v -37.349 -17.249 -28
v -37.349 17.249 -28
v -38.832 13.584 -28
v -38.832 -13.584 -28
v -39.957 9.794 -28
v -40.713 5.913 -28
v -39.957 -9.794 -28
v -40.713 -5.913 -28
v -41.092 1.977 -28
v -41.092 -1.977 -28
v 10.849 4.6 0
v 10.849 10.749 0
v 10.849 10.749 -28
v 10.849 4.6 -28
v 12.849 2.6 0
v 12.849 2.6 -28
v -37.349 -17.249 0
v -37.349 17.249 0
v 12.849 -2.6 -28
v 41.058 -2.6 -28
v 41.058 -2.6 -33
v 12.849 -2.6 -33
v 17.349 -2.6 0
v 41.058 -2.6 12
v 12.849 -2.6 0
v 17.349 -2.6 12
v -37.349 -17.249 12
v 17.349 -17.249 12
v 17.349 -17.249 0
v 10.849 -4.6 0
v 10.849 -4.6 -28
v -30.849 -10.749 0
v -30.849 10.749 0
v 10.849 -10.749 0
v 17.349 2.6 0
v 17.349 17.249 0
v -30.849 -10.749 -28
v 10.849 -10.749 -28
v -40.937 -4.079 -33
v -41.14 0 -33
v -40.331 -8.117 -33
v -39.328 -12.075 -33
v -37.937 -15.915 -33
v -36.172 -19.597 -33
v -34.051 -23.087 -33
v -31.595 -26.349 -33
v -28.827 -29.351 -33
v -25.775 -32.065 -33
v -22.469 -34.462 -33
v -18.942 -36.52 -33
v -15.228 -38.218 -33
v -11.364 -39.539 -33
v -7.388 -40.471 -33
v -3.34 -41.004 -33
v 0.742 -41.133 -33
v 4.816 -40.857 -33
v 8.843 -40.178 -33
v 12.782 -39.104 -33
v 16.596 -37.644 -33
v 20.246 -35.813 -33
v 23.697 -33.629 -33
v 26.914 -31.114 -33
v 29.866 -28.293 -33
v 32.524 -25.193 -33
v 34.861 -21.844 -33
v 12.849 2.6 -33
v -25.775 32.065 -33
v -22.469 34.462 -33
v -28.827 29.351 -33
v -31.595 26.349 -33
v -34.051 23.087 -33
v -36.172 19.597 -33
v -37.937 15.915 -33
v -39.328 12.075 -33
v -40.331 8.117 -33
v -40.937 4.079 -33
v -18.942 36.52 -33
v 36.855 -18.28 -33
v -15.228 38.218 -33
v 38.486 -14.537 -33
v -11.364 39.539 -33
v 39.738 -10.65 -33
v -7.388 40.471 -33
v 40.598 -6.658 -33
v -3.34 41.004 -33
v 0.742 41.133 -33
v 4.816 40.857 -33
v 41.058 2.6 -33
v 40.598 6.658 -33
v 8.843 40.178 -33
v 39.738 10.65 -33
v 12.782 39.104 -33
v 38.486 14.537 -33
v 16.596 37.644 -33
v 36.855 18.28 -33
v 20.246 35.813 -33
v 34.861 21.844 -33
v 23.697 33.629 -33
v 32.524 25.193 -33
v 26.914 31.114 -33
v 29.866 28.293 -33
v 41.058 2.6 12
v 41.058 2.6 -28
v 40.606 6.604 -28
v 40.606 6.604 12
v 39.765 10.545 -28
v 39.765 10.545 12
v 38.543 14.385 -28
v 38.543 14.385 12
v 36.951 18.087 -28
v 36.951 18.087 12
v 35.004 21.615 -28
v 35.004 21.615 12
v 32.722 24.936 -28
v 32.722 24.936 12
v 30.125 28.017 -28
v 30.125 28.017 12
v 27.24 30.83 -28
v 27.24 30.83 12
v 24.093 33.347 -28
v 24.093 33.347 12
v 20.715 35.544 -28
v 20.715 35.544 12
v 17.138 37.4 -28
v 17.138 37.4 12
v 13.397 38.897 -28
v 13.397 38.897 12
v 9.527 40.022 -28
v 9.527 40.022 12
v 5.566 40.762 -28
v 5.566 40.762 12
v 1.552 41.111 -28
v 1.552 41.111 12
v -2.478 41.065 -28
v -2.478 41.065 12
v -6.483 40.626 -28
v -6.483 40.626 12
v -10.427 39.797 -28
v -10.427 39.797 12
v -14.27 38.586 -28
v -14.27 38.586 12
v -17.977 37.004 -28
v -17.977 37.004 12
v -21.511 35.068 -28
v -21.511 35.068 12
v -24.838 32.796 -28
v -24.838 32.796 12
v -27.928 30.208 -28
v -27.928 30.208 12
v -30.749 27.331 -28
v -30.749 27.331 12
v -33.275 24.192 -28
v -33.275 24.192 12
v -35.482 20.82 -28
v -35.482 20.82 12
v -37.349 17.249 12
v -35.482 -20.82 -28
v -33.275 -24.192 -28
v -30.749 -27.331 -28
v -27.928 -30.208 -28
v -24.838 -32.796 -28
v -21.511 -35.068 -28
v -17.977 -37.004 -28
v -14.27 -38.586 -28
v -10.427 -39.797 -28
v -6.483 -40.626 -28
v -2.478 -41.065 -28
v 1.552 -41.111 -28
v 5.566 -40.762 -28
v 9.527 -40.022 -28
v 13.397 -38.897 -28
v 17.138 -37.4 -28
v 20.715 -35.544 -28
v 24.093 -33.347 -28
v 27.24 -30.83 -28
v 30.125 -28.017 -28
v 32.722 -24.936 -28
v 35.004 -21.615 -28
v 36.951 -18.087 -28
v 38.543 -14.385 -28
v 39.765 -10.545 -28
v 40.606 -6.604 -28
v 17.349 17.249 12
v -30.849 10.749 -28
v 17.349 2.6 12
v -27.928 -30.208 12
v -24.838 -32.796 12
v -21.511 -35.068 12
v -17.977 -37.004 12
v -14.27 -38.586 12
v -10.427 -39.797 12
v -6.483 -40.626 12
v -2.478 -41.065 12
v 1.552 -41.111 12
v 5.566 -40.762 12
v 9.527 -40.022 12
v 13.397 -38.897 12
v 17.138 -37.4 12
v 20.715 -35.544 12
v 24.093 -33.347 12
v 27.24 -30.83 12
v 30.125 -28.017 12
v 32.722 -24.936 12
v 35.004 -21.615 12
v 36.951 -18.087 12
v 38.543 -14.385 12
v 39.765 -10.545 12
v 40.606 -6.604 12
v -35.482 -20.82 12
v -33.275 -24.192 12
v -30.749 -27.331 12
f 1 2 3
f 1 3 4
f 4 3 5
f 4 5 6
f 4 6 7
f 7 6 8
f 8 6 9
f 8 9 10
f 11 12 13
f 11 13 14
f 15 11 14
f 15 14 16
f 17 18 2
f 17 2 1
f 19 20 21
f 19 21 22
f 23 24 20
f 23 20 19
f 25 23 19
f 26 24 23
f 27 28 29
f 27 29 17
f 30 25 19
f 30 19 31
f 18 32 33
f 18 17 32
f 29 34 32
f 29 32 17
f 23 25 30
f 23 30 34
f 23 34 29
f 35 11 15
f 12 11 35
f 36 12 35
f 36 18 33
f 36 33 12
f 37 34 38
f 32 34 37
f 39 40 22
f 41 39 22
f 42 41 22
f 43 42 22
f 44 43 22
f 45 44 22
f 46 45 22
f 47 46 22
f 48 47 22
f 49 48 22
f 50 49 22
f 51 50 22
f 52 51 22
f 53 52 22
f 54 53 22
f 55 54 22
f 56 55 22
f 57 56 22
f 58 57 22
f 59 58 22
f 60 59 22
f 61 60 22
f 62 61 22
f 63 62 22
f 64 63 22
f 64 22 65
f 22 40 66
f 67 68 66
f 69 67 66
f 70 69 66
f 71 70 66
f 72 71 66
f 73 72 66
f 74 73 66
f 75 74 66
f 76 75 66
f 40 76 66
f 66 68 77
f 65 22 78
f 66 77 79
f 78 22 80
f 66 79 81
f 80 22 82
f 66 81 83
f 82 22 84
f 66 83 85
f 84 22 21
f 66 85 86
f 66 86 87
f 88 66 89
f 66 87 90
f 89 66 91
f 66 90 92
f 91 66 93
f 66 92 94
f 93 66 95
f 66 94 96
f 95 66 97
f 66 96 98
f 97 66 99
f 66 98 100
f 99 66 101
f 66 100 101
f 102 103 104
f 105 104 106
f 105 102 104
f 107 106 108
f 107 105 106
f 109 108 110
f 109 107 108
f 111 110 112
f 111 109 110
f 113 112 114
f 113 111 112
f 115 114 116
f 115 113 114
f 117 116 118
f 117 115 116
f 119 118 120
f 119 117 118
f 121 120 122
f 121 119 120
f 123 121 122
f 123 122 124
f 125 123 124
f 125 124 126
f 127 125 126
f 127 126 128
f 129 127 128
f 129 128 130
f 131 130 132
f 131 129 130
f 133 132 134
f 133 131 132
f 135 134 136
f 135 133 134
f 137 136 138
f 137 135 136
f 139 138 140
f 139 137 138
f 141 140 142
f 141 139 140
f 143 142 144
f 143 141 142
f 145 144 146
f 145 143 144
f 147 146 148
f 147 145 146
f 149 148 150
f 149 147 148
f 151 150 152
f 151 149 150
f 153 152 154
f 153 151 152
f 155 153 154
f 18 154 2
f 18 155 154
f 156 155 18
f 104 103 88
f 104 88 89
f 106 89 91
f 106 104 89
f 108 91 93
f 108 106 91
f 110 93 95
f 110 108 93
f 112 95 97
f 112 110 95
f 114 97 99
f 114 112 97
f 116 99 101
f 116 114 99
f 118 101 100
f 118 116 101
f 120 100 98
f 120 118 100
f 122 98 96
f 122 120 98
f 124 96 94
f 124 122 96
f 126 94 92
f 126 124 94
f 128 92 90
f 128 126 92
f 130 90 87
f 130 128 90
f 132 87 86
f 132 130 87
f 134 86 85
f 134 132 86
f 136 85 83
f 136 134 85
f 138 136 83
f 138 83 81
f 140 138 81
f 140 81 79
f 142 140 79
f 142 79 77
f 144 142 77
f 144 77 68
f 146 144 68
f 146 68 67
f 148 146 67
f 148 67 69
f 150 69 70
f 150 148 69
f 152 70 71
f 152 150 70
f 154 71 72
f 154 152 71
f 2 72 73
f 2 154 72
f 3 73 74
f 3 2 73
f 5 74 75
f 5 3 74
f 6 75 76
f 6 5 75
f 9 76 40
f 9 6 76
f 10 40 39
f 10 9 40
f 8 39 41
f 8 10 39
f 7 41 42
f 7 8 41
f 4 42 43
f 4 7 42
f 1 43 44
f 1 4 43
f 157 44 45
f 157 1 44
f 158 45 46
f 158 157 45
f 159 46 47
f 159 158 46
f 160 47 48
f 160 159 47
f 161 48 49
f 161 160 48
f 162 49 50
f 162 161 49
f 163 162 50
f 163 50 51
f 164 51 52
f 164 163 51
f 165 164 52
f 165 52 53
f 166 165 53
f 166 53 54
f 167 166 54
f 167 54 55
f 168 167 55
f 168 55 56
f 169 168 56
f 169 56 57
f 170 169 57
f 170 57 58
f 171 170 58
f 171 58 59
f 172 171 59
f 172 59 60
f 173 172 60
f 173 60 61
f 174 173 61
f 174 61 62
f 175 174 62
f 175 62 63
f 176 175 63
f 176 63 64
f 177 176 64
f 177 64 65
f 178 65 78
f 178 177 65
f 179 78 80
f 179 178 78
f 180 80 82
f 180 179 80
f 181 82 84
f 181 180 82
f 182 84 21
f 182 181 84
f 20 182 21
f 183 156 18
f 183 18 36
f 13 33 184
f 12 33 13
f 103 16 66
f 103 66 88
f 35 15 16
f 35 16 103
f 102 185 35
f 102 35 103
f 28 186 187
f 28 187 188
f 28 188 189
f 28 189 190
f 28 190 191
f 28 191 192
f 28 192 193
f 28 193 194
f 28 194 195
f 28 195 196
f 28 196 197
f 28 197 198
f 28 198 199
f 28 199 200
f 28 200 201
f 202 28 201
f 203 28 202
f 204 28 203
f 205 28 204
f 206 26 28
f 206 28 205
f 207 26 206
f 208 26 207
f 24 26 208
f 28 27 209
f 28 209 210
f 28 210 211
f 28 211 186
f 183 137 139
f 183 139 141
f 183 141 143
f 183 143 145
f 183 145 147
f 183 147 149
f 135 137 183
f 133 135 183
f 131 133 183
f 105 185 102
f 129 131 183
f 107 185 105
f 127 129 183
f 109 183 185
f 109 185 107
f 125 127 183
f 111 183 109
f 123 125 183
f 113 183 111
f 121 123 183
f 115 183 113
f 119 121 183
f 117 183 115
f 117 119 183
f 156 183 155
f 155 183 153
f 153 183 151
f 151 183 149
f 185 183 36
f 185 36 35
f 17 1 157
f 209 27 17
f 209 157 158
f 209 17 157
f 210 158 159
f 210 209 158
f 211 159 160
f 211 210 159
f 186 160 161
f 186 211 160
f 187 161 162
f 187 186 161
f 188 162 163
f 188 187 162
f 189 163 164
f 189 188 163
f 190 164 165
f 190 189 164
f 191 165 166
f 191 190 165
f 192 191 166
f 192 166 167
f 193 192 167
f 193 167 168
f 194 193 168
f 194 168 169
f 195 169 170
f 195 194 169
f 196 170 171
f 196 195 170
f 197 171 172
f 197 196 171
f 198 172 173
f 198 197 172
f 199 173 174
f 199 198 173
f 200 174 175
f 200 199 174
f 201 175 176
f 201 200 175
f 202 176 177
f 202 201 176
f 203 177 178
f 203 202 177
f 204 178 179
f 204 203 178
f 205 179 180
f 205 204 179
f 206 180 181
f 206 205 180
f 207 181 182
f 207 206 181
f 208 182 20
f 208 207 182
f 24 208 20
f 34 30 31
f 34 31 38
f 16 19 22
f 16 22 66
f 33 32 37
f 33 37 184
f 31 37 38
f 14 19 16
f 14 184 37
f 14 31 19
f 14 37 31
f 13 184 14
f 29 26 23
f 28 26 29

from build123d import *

# Parameters (mm, degrees)
BOSS_EXTRUDE1_DEPTH = 28
BOSS_EXTRUDE2_DEPTH = 5
BOSS_EXTRUDE6_START = 40
BOSS_EXTRUDE6_DEPTH = 40


with BuildPart() as part:
    # Sketch1 → Boss-Extrude1 (new body)
    with BuildSketch(Plane.XY):
        Polygon((10.849101299, 4.6), (12.849101299, 2.6), (17.349101299, 2.6), (17.349101299, 17.249101299), (-37.349101299, 17.249101299), (-37.349101299, -17.249101299), (17.349101299, -17.249101299), (17.349101299, -2.6), (12.849101299, -2.6), (10.849101299, -4.6), (10.849101299, -10.749101299), (-30.849101299, -10.749101299), (-30.849101299, 10.749101299), (10.849101299, 10.749101299), align=None)
    extrude(amount=-BOSS_EXTRUDE1_DEPTH)

    # Sketch2 → Boss-Extrude2 (add)
    with BuildSketch(Plane(origin=(0, 0, -28), x_dir=(-1, 0, 0), z_dir=(0, 0, -1))):
        with BuildLine():
            Line((-12.849101299, 2.6), (-41.057604209, 2.6))
            ThreePointArc((-41.057604209, 2.6), (41.139845204, 0), (-41.057604209, -2.6))
            Line((-41.057604209, -2.6), (-12.849101299, -2.6))
            Line((-12.849101299, -2.6), (-12.849101299, 2.6))
        make_face()
    extrude(amount=BOSS_EXTRUDE2_DEPTH)

    # Sketch3 → Boss-Extrude6 (add)
    with BuildSketch(Plane.XY.offset(-28).offset(BOSS_EXTRUDE6_START)):
        with BuildLine():
            Line((-37.349101299, 17.249101299), (17.349101299, 17.249101299))
            Line((17.349101299, 17.249101299), (17.349101299, 2.6))
            Line((17.349101299, 2.6), (41.057604209, 2.6))
            ThreePointArc((41.057604209, 2.6), (7.55561319, 40.440073847), (-37.349101299, 17.249101299))
        make_face()
        with BuildLine():
            Line((41.057604209, -2.6), (17.349101299, -2.6))
            Line((17.349101299, -2.6), (17.349101299, -17.249101299))
            Line((17.349101299, -17.249101299), (-37.349101299, -17.249101299))
            ThreePointArc((-37.349101299, -17.249101299), (7.55561319, -40.440073847), (41.057604209, -2.6))
        make_face()
    extrude(amount=-BOSS_EXTRUDE6_DEPTH)


solid = part.part
